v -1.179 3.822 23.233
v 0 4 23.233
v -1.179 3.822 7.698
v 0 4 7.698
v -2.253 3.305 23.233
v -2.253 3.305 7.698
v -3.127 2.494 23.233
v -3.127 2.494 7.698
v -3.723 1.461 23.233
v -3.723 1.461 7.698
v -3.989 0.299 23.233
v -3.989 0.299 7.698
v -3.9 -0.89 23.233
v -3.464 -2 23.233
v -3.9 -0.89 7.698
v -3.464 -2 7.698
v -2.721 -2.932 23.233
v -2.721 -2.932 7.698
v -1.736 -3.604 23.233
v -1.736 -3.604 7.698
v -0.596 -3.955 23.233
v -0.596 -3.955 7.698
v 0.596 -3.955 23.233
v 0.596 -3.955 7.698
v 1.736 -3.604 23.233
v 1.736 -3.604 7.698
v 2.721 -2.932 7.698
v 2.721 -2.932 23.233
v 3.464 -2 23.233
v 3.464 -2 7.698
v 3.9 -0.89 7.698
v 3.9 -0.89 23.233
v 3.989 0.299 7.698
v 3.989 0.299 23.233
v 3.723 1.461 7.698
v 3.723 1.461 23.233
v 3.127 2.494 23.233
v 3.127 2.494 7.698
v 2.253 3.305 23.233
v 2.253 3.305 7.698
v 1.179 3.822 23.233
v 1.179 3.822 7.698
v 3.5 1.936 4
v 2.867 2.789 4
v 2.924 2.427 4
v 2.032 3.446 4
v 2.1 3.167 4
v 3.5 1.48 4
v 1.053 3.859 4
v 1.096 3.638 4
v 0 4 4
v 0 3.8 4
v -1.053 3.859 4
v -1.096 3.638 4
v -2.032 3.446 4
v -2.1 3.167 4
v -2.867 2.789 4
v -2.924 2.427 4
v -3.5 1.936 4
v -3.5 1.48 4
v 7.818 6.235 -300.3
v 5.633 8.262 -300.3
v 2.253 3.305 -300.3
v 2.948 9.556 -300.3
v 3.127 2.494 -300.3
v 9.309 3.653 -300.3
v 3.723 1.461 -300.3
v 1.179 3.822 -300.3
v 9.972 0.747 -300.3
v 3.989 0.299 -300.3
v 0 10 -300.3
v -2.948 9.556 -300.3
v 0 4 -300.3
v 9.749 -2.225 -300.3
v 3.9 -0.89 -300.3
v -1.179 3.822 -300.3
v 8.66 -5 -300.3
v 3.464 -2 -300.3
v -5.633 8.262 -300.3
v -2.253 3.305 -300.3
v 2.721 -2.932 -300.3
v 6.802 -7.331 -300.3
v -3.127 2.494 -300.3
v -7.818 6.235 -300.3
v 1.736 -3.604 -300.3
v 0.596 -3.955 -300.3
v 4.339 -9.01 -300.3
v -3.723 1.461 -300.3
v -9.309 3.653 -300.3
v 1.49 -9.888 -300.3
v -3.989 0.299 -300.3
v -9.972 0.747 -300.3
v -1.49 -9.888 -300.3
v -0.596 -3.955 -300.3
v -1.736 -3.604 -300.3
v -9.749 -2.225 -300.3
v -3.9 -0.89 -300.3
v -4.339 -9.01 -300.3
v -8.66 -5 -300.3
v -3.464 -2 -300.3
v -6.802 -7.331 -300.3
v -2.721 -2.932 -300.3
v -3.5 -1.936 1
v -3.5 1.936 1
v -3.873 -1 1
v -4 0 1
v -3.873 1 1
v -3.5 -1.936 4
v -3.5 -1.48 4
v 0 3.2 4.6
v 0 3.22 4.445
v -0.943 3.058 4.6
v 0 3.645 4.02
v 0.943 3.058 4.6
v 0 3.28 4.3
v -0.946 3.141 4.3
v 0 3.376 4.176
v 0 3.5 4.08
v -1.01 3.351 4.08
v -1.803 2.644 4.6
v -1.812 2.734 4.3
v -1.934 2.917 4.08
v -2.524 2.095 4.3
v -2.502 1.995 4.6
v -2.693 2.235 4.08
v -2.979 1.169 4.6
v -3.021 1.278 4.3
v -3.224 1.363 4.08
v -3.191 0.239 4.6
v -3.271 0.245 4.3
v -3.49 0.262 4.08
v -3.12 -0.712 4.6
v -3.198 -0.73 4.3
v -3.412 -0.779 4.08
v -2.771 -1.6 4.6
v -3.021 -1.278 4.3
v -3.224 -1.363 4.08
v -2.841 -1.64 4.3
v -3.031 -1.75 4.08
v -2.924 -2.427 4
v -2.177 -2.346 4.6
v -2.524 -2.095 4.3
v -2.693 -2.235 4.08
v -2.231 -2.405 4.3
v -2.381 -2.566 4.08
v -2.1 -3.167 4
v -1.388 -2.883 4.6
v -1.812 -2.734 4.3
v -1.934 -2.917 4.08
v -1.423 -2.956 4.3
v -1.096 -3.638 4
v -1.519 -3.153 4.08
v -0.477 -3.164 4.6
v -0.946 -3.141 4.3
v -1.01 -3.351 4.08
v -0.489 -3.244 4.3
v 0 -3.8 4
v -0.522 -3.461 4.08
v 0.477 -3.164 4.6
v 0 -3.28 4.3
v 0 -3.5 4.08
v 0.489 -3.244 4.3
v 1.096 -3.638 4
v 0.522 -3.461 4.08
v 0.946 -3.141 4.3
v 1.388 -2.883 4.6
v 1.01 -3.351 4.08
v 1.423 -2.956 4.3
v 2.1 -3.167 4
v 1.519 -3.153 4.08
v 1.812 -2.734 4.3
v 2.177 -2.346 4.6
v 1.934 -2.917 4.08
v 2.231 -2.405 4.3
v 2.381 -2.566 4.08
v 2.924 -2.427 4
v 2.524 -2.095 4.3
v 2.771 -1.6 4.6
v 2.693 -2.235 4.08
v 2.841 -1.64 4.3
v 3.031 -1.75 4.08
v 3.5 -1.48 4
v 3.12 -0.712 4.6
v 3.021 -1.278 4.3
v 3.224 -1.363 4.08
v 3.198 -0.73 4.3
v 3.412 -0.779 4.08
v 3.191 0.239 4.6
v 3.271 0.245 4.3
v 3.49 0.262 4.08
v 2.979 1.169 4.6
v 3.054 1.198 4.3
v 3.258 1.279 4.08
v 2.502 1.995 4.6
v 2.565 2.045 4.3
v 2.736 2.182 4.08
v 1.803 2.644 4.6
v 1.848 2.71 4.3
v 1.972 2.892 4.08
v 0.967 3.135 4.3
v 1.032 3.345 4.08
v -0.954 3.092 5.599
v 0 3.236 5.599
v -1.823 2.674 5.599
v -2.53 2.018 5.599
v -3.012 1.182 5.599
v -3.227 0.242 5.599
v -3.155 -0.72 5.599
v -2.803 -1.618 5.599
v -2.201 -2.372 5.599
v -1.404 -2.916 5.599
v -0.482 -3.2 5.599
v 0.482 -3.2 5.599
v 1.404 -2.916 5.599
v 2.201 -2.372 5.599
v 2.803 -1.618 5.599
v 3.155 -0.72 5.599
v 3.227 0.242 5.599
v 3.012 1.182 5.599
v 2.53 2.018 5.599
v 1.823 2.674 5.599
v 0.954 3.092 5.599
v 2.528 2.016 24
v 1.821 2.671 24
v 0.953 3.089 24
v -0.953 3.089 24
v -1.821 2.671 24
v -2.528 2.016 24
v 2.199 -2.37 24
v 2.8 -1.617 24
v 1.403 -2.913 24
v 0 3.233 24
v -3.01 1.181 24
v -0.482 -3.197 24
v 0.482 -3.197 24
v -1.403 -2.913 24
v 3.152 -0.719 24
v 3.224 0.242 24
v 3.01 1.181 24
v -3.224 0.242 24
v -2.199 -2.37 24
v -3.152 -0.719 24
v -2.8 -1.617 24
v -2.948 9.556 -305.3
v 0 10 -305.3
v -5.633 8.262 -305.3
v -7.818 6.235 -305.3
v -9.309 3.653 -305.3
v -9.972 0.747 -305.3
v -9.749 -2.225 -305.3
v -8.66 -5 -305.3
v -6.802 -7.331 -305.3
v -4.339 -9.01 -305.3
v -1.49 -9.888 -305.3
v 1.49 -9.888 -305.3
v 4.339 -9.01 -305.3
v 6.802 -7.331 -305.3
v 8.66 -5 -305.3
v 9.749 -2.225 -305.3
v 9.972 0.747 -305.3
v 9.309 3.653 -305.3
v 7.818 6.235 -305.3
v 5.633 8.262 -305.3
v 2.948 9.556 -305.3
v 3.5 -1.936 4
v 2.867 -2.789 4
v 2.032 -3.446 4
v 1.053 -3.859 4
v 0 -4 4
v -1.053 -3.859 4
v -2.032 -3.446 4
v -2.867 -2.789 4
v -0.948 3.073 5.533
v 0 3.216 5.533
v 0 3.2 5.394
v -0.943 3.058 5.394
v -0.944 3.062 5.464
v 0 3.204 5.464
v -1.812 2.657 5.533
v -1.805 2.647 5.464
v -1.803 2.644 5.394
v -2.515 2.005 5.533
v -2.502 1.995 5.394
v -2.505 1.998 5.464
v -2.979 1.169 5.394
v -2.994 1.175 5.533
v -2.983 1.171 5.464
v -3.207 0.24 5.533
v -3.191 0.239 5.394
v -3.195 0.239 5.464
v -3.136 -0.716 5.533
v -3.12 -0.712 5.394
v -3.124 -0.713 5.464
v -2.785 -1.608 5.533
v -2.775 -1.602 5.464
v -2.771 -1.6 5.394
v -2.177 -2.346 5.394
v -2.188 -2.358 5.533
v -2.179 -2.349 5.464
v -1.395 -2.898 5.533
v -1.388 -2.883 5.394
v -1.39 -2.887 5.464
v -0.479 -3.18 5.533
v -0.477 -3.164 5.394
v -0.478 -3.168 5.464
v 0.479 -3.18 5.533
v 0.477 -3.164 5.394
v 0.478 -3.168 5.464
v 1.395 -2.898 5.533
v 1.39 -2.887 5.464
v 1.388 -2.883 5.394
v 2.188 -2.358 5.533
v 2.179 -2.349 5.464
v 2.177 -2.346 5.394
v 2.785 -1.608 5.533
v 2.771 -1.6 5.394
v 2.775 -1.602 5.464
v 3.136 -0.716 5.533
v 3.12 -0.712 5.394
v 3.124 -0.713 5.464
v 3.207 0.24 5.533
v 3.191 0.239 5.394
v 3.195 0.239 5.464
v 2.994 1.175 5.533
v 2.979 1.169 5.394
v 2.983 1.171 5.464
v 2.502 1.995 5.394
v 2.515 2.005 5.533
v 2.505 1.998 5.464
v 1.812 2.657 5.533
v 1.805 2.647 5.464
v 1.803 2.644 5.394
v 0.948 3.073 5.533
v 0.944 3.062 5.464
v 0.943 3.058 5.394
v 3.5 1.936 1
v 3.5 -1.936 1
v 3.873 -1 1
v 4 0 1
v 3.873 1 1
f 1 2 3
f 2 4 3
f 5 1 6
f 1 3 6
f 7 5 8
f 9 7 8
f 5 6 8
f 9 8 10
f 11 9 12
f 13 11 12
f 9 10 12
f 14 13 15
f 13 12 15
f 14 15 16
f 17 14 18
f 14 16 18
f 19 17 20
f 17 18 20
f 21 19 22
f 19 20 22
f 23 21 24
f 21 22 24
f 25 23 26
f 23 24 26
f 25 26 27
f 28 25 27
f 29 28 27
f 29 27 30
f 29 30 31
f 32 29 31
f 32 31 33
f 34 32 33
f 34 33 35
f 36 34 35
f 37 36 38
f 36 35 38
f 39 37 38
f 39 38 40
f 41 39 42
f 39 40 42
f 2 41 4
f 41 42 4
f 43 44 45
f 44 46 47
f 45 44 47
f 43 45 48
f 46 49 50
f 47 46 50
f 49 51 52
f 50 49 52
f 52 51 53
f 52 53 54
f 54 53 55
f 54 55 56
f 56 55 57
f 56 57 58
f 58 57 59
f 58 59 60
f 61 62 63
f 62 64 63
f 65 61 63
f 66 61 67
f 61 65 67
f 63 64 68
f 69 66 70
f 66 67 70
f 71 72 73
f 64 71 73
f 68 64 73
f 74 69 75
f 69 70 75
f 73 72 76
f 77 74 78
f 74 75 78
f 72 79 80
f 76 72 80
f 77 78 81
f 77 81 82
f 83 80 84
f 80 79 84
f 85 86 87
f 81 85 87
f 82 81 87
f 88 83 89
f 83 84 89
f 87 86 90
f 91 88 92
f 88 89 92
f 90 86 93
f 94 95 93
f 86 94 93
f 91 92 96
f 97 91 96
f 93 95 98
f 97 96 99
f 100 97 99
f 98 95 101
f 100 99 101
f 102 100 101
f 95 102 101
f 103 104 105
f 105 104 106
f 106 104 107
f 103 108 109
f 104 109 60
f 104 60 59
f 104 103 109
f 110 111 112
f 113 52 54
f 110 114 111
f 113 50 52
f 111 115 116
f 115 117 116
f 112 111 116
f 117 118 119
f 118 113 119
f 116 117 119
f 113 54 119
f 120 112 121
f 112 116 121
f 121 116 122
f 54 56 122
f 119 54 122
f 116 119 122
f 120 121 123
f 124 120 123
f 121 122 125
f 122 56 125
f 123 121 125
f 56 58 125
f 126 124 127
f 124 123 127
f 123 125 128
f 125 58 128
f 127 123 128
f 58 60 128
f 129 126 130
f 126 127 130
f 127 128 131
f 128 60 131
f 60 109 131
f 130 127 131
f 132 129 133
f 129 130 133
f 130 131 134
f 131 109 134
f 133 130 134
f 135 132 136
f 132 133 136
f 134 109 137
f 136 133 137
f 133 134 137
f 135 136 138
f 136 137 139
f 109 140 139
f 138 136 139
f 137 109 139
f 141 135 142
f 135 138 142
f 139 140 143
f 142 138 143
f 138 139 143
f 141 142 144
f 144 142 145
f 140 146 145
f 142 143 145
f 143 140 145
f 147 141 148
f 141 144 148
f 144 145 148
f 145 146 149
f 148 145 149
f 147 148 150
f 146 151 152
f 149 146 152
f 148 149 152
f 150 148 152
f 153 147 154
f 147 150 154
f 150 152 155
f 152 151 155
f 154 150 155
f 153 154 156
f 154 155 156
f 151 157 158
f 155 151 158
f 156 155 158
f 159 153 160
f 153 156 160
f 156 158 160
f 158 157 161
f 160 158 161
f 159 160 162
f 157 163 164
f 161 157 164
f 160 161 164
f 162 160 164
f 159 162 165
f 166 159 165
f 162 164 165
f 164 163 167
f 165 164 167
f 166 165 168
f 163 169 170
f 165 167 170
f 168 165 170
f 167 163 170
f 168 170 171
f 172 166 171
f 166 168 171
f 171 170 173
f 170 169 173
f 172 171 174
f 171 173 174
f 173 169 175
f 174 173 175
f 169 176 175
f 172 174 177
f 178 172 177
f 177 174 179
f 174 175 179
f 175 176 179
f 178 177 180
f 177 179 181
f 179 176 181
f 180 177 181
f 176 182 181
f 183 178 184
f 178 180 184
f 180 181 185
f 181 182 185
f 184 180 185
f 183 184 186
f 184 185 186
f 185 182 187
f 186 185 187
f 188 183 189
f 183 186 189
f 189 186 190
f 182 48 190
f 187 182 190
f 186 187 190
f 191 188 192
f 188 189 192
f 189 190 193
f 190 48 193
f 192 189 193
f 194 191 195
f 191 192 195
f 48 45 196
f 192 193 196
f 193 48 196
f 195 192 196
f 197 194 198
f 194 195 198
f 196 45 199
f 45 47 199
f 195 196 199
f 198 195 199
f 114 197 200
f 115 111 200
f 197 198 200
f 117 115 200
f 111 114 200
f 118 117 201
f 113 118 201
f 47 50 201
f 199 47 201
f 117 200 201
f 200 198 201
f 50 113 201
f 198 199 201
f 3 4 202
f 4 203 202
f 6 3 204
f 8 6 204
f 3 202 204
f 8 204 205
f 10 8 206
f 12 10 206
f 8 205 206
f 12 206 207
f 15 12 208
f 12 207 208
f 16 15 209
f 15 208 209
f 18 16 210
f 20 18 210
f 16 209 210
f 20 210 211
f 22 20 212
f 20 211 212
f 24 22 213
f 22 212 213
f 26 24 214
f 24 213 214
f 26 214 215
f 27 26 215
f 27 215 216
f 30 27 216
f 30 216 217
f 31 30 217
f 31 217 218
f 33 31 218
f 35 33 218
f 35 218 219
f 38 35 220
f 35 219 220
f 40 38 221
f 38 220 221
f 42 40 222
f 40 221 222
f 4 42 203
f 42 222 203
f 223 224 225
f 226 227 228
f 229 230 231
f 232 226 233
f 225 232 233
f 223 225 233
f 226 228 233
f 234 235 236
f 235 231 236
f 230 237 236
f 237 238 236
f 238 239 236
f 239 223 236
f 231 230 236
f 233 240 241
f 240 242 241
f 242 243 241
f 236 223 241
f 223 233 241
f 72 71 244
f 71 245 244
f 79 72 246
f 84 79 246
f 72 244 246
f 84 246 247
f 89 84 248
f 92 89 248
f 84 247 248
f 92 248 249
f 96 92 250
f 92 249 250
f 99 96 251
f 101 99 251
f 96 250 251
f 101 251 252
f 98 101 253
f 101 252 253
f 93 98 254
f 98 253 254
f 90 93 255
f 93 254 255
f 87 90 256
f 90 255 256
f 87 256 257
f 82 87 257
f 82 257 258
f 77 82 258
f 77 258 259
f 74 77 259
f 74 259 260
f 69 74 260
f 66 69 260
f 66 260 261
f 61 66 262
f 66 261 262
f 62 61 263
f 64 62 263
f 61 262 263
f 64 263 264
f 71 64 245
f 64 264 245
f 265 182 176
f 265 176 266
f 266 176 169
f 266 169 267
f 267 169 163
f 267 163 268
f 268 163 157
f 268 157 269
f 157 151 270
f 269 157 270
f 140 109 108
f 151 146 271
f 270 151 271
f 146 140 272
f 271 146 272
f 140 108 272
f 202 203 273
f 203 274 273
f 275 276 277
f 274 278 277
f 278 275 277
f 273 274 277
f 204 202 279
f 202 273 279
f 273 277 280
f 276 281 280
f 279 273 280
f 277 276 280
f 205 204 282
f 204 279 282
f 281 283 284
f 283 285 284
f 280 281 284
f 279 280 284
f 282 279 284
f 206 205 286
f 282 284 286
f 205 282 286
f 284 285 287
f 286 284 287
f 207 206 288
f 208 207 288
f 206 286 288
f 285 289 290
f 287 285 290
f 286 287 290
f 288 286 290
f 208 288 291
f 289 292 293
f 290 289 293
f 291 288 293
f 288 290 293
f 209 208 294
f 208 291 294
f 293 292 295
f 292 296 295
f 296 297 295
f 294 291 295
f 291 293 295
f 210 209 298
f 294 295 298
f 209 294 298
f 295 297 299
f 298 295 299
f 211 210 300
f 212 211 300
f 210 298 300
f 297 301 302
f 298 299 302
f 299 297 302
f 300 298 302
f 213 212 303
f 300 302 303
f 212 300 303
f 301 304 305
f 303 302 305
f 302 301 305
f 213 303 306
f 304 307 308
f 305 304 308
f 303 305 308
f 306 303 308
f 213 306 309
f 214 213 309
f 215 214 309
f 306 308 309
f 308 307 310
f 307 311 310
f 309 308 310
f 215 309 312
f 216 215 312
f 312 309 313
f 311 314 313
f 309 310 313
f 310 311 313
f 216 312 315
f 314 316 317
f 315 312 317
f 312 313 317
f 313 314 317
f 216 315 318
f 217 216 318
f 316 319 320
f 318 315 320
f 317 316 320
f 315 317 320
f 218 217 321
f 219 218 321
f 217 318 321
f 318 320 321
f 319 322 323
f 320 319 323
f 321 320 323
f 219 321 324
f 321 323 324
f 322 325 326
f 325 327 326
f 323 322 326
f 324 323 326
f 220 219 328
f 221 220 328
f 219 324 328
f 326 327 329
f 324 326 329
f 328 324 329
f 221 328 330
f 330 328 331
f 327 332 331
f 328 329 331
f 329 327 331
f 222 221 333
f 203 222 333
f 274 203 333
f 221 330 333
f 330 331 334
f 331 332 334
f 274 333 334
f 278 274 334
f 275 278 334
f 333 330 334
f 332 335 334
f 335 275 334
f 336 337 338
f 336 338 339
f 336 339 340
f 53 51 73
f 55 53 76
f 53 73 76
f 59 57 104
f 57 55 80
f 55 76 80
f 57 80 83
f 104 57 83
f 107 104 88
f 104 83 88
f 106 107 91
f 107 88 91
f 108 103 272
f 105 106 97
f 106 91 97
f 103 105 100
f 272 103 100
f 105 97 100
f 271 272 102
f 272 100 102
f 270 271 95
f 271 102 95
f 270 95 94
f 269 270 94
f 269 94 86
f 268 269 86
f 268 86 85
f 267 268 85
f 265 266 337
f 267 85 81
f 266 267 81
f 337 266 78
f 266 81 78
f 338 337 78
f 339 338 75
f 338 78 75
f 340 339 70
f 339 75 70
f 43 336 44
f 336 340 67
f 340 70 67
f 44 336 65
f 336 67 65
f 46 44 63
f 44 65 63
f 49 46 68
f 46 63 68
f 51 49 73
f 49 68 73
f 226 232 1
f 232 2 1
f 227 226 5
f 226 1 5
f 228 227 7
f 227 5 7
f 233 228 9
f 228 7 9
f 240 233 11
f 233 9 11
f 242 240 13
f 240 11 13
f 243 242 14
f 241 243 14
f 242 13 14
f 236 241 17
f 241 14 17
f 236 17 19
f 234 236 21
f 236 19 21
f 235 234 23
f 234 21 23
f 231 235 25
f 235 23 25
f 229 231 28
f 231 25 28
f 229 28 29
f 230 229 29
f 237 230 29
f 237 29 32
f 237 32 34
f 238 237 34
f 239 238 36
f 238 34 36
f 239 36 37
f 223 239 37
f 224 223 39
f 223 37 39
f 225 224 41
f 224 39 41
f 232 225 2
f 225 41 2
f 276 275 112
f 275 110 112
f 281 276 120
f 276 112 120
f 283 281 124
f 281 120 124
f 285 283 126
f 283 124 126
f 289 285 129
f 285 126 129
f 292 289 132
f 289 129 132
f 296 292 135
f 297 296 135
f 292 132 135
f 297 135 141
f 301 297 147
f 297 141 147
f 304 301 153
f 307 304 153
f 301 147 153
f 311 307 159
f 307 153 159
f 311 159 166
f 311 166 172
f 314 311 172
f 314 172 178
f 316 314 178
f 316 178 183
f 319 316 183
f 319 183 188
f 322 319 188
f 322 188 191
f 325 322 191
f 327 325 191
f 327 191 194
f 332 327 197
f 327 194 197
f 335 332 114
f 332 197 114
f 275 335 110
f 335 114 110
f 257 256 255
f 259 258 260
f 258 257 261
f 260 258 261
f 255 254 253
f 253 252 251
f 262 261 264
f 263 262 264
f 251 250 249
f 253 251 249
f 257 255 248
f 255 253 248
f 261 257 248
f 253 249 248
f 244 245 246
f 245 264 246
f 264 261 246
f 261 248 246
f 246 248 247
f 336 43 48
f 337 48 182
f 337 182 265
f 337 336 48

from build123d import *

# Parameters (mm, degrees)
CUT_EXTRUDE1_DEPTH = 4


with BuildPart() as part:
    # Sketch1 → Revolve1 (revolve)
    with BuildSketch(Plane(origin=(0, 0, 0), x_dir=(0, 0, -1), z_dir=(1, 0, 0))):
        Polygon((-4, 0), (-4, 4), (300.3, 4), (300.3, 10), (305.3, 10), (305.3, 0), align=None)
    revolve(axis=Axis((0, 0, -305.3), (0, 0, 1)))

    # Sketch2 → Revolve2 (revolve)
    with BuildSketch(Plane(origin=(0, 0, 0), x_dir=(0, 0, -1), z_dir=(1, 0, 0))):
        with BuildLine():
            Line((-24, 0), (-24, 3.233))
            Line((-24, 3.233), (-23.233, 4))
            Line((-23.233, 4), (-7.697981936, 4))
            Line((-7.697981936, 4), (-5.599415898, 3.236184428))
            ThreePointArc((-5.599415898, 3.236184428), (-5.498392718, 3.209115348), (-5.394203812, 3.2))
            Line((-5.394203812, 3.2), (-4.6, 3.2))
            ThreePointArc((-4.6, 3.2), (-4.175735931, 3.375735931), (-4, 3.8))
            Line((-4, 3.8), (-4, 4))
            Line((-4, 4), (-3, 4))
            Line((-3, 4), (-3, 0))
            Line((-3, 0), (-24, 0))
        make_face()
    revolve(axis=Axis((0, 0, 3), (0, 0, 1)))

    # Sketch3 → Cut-Extrude1 (cut)
    with BuildSketch(Plane.XY.offset(1)):
        Polygon((-7, 14), (-7, -7), (-3.5, -7), (-3.5, 7), (3.5, 7), (3.5, -7), (7, -7), (7, 14), align=None)
    extrude(amount=CUT_EXTRUDE1_DEPTH, mode=Mode.SUBTRACT)


solid = part.part
